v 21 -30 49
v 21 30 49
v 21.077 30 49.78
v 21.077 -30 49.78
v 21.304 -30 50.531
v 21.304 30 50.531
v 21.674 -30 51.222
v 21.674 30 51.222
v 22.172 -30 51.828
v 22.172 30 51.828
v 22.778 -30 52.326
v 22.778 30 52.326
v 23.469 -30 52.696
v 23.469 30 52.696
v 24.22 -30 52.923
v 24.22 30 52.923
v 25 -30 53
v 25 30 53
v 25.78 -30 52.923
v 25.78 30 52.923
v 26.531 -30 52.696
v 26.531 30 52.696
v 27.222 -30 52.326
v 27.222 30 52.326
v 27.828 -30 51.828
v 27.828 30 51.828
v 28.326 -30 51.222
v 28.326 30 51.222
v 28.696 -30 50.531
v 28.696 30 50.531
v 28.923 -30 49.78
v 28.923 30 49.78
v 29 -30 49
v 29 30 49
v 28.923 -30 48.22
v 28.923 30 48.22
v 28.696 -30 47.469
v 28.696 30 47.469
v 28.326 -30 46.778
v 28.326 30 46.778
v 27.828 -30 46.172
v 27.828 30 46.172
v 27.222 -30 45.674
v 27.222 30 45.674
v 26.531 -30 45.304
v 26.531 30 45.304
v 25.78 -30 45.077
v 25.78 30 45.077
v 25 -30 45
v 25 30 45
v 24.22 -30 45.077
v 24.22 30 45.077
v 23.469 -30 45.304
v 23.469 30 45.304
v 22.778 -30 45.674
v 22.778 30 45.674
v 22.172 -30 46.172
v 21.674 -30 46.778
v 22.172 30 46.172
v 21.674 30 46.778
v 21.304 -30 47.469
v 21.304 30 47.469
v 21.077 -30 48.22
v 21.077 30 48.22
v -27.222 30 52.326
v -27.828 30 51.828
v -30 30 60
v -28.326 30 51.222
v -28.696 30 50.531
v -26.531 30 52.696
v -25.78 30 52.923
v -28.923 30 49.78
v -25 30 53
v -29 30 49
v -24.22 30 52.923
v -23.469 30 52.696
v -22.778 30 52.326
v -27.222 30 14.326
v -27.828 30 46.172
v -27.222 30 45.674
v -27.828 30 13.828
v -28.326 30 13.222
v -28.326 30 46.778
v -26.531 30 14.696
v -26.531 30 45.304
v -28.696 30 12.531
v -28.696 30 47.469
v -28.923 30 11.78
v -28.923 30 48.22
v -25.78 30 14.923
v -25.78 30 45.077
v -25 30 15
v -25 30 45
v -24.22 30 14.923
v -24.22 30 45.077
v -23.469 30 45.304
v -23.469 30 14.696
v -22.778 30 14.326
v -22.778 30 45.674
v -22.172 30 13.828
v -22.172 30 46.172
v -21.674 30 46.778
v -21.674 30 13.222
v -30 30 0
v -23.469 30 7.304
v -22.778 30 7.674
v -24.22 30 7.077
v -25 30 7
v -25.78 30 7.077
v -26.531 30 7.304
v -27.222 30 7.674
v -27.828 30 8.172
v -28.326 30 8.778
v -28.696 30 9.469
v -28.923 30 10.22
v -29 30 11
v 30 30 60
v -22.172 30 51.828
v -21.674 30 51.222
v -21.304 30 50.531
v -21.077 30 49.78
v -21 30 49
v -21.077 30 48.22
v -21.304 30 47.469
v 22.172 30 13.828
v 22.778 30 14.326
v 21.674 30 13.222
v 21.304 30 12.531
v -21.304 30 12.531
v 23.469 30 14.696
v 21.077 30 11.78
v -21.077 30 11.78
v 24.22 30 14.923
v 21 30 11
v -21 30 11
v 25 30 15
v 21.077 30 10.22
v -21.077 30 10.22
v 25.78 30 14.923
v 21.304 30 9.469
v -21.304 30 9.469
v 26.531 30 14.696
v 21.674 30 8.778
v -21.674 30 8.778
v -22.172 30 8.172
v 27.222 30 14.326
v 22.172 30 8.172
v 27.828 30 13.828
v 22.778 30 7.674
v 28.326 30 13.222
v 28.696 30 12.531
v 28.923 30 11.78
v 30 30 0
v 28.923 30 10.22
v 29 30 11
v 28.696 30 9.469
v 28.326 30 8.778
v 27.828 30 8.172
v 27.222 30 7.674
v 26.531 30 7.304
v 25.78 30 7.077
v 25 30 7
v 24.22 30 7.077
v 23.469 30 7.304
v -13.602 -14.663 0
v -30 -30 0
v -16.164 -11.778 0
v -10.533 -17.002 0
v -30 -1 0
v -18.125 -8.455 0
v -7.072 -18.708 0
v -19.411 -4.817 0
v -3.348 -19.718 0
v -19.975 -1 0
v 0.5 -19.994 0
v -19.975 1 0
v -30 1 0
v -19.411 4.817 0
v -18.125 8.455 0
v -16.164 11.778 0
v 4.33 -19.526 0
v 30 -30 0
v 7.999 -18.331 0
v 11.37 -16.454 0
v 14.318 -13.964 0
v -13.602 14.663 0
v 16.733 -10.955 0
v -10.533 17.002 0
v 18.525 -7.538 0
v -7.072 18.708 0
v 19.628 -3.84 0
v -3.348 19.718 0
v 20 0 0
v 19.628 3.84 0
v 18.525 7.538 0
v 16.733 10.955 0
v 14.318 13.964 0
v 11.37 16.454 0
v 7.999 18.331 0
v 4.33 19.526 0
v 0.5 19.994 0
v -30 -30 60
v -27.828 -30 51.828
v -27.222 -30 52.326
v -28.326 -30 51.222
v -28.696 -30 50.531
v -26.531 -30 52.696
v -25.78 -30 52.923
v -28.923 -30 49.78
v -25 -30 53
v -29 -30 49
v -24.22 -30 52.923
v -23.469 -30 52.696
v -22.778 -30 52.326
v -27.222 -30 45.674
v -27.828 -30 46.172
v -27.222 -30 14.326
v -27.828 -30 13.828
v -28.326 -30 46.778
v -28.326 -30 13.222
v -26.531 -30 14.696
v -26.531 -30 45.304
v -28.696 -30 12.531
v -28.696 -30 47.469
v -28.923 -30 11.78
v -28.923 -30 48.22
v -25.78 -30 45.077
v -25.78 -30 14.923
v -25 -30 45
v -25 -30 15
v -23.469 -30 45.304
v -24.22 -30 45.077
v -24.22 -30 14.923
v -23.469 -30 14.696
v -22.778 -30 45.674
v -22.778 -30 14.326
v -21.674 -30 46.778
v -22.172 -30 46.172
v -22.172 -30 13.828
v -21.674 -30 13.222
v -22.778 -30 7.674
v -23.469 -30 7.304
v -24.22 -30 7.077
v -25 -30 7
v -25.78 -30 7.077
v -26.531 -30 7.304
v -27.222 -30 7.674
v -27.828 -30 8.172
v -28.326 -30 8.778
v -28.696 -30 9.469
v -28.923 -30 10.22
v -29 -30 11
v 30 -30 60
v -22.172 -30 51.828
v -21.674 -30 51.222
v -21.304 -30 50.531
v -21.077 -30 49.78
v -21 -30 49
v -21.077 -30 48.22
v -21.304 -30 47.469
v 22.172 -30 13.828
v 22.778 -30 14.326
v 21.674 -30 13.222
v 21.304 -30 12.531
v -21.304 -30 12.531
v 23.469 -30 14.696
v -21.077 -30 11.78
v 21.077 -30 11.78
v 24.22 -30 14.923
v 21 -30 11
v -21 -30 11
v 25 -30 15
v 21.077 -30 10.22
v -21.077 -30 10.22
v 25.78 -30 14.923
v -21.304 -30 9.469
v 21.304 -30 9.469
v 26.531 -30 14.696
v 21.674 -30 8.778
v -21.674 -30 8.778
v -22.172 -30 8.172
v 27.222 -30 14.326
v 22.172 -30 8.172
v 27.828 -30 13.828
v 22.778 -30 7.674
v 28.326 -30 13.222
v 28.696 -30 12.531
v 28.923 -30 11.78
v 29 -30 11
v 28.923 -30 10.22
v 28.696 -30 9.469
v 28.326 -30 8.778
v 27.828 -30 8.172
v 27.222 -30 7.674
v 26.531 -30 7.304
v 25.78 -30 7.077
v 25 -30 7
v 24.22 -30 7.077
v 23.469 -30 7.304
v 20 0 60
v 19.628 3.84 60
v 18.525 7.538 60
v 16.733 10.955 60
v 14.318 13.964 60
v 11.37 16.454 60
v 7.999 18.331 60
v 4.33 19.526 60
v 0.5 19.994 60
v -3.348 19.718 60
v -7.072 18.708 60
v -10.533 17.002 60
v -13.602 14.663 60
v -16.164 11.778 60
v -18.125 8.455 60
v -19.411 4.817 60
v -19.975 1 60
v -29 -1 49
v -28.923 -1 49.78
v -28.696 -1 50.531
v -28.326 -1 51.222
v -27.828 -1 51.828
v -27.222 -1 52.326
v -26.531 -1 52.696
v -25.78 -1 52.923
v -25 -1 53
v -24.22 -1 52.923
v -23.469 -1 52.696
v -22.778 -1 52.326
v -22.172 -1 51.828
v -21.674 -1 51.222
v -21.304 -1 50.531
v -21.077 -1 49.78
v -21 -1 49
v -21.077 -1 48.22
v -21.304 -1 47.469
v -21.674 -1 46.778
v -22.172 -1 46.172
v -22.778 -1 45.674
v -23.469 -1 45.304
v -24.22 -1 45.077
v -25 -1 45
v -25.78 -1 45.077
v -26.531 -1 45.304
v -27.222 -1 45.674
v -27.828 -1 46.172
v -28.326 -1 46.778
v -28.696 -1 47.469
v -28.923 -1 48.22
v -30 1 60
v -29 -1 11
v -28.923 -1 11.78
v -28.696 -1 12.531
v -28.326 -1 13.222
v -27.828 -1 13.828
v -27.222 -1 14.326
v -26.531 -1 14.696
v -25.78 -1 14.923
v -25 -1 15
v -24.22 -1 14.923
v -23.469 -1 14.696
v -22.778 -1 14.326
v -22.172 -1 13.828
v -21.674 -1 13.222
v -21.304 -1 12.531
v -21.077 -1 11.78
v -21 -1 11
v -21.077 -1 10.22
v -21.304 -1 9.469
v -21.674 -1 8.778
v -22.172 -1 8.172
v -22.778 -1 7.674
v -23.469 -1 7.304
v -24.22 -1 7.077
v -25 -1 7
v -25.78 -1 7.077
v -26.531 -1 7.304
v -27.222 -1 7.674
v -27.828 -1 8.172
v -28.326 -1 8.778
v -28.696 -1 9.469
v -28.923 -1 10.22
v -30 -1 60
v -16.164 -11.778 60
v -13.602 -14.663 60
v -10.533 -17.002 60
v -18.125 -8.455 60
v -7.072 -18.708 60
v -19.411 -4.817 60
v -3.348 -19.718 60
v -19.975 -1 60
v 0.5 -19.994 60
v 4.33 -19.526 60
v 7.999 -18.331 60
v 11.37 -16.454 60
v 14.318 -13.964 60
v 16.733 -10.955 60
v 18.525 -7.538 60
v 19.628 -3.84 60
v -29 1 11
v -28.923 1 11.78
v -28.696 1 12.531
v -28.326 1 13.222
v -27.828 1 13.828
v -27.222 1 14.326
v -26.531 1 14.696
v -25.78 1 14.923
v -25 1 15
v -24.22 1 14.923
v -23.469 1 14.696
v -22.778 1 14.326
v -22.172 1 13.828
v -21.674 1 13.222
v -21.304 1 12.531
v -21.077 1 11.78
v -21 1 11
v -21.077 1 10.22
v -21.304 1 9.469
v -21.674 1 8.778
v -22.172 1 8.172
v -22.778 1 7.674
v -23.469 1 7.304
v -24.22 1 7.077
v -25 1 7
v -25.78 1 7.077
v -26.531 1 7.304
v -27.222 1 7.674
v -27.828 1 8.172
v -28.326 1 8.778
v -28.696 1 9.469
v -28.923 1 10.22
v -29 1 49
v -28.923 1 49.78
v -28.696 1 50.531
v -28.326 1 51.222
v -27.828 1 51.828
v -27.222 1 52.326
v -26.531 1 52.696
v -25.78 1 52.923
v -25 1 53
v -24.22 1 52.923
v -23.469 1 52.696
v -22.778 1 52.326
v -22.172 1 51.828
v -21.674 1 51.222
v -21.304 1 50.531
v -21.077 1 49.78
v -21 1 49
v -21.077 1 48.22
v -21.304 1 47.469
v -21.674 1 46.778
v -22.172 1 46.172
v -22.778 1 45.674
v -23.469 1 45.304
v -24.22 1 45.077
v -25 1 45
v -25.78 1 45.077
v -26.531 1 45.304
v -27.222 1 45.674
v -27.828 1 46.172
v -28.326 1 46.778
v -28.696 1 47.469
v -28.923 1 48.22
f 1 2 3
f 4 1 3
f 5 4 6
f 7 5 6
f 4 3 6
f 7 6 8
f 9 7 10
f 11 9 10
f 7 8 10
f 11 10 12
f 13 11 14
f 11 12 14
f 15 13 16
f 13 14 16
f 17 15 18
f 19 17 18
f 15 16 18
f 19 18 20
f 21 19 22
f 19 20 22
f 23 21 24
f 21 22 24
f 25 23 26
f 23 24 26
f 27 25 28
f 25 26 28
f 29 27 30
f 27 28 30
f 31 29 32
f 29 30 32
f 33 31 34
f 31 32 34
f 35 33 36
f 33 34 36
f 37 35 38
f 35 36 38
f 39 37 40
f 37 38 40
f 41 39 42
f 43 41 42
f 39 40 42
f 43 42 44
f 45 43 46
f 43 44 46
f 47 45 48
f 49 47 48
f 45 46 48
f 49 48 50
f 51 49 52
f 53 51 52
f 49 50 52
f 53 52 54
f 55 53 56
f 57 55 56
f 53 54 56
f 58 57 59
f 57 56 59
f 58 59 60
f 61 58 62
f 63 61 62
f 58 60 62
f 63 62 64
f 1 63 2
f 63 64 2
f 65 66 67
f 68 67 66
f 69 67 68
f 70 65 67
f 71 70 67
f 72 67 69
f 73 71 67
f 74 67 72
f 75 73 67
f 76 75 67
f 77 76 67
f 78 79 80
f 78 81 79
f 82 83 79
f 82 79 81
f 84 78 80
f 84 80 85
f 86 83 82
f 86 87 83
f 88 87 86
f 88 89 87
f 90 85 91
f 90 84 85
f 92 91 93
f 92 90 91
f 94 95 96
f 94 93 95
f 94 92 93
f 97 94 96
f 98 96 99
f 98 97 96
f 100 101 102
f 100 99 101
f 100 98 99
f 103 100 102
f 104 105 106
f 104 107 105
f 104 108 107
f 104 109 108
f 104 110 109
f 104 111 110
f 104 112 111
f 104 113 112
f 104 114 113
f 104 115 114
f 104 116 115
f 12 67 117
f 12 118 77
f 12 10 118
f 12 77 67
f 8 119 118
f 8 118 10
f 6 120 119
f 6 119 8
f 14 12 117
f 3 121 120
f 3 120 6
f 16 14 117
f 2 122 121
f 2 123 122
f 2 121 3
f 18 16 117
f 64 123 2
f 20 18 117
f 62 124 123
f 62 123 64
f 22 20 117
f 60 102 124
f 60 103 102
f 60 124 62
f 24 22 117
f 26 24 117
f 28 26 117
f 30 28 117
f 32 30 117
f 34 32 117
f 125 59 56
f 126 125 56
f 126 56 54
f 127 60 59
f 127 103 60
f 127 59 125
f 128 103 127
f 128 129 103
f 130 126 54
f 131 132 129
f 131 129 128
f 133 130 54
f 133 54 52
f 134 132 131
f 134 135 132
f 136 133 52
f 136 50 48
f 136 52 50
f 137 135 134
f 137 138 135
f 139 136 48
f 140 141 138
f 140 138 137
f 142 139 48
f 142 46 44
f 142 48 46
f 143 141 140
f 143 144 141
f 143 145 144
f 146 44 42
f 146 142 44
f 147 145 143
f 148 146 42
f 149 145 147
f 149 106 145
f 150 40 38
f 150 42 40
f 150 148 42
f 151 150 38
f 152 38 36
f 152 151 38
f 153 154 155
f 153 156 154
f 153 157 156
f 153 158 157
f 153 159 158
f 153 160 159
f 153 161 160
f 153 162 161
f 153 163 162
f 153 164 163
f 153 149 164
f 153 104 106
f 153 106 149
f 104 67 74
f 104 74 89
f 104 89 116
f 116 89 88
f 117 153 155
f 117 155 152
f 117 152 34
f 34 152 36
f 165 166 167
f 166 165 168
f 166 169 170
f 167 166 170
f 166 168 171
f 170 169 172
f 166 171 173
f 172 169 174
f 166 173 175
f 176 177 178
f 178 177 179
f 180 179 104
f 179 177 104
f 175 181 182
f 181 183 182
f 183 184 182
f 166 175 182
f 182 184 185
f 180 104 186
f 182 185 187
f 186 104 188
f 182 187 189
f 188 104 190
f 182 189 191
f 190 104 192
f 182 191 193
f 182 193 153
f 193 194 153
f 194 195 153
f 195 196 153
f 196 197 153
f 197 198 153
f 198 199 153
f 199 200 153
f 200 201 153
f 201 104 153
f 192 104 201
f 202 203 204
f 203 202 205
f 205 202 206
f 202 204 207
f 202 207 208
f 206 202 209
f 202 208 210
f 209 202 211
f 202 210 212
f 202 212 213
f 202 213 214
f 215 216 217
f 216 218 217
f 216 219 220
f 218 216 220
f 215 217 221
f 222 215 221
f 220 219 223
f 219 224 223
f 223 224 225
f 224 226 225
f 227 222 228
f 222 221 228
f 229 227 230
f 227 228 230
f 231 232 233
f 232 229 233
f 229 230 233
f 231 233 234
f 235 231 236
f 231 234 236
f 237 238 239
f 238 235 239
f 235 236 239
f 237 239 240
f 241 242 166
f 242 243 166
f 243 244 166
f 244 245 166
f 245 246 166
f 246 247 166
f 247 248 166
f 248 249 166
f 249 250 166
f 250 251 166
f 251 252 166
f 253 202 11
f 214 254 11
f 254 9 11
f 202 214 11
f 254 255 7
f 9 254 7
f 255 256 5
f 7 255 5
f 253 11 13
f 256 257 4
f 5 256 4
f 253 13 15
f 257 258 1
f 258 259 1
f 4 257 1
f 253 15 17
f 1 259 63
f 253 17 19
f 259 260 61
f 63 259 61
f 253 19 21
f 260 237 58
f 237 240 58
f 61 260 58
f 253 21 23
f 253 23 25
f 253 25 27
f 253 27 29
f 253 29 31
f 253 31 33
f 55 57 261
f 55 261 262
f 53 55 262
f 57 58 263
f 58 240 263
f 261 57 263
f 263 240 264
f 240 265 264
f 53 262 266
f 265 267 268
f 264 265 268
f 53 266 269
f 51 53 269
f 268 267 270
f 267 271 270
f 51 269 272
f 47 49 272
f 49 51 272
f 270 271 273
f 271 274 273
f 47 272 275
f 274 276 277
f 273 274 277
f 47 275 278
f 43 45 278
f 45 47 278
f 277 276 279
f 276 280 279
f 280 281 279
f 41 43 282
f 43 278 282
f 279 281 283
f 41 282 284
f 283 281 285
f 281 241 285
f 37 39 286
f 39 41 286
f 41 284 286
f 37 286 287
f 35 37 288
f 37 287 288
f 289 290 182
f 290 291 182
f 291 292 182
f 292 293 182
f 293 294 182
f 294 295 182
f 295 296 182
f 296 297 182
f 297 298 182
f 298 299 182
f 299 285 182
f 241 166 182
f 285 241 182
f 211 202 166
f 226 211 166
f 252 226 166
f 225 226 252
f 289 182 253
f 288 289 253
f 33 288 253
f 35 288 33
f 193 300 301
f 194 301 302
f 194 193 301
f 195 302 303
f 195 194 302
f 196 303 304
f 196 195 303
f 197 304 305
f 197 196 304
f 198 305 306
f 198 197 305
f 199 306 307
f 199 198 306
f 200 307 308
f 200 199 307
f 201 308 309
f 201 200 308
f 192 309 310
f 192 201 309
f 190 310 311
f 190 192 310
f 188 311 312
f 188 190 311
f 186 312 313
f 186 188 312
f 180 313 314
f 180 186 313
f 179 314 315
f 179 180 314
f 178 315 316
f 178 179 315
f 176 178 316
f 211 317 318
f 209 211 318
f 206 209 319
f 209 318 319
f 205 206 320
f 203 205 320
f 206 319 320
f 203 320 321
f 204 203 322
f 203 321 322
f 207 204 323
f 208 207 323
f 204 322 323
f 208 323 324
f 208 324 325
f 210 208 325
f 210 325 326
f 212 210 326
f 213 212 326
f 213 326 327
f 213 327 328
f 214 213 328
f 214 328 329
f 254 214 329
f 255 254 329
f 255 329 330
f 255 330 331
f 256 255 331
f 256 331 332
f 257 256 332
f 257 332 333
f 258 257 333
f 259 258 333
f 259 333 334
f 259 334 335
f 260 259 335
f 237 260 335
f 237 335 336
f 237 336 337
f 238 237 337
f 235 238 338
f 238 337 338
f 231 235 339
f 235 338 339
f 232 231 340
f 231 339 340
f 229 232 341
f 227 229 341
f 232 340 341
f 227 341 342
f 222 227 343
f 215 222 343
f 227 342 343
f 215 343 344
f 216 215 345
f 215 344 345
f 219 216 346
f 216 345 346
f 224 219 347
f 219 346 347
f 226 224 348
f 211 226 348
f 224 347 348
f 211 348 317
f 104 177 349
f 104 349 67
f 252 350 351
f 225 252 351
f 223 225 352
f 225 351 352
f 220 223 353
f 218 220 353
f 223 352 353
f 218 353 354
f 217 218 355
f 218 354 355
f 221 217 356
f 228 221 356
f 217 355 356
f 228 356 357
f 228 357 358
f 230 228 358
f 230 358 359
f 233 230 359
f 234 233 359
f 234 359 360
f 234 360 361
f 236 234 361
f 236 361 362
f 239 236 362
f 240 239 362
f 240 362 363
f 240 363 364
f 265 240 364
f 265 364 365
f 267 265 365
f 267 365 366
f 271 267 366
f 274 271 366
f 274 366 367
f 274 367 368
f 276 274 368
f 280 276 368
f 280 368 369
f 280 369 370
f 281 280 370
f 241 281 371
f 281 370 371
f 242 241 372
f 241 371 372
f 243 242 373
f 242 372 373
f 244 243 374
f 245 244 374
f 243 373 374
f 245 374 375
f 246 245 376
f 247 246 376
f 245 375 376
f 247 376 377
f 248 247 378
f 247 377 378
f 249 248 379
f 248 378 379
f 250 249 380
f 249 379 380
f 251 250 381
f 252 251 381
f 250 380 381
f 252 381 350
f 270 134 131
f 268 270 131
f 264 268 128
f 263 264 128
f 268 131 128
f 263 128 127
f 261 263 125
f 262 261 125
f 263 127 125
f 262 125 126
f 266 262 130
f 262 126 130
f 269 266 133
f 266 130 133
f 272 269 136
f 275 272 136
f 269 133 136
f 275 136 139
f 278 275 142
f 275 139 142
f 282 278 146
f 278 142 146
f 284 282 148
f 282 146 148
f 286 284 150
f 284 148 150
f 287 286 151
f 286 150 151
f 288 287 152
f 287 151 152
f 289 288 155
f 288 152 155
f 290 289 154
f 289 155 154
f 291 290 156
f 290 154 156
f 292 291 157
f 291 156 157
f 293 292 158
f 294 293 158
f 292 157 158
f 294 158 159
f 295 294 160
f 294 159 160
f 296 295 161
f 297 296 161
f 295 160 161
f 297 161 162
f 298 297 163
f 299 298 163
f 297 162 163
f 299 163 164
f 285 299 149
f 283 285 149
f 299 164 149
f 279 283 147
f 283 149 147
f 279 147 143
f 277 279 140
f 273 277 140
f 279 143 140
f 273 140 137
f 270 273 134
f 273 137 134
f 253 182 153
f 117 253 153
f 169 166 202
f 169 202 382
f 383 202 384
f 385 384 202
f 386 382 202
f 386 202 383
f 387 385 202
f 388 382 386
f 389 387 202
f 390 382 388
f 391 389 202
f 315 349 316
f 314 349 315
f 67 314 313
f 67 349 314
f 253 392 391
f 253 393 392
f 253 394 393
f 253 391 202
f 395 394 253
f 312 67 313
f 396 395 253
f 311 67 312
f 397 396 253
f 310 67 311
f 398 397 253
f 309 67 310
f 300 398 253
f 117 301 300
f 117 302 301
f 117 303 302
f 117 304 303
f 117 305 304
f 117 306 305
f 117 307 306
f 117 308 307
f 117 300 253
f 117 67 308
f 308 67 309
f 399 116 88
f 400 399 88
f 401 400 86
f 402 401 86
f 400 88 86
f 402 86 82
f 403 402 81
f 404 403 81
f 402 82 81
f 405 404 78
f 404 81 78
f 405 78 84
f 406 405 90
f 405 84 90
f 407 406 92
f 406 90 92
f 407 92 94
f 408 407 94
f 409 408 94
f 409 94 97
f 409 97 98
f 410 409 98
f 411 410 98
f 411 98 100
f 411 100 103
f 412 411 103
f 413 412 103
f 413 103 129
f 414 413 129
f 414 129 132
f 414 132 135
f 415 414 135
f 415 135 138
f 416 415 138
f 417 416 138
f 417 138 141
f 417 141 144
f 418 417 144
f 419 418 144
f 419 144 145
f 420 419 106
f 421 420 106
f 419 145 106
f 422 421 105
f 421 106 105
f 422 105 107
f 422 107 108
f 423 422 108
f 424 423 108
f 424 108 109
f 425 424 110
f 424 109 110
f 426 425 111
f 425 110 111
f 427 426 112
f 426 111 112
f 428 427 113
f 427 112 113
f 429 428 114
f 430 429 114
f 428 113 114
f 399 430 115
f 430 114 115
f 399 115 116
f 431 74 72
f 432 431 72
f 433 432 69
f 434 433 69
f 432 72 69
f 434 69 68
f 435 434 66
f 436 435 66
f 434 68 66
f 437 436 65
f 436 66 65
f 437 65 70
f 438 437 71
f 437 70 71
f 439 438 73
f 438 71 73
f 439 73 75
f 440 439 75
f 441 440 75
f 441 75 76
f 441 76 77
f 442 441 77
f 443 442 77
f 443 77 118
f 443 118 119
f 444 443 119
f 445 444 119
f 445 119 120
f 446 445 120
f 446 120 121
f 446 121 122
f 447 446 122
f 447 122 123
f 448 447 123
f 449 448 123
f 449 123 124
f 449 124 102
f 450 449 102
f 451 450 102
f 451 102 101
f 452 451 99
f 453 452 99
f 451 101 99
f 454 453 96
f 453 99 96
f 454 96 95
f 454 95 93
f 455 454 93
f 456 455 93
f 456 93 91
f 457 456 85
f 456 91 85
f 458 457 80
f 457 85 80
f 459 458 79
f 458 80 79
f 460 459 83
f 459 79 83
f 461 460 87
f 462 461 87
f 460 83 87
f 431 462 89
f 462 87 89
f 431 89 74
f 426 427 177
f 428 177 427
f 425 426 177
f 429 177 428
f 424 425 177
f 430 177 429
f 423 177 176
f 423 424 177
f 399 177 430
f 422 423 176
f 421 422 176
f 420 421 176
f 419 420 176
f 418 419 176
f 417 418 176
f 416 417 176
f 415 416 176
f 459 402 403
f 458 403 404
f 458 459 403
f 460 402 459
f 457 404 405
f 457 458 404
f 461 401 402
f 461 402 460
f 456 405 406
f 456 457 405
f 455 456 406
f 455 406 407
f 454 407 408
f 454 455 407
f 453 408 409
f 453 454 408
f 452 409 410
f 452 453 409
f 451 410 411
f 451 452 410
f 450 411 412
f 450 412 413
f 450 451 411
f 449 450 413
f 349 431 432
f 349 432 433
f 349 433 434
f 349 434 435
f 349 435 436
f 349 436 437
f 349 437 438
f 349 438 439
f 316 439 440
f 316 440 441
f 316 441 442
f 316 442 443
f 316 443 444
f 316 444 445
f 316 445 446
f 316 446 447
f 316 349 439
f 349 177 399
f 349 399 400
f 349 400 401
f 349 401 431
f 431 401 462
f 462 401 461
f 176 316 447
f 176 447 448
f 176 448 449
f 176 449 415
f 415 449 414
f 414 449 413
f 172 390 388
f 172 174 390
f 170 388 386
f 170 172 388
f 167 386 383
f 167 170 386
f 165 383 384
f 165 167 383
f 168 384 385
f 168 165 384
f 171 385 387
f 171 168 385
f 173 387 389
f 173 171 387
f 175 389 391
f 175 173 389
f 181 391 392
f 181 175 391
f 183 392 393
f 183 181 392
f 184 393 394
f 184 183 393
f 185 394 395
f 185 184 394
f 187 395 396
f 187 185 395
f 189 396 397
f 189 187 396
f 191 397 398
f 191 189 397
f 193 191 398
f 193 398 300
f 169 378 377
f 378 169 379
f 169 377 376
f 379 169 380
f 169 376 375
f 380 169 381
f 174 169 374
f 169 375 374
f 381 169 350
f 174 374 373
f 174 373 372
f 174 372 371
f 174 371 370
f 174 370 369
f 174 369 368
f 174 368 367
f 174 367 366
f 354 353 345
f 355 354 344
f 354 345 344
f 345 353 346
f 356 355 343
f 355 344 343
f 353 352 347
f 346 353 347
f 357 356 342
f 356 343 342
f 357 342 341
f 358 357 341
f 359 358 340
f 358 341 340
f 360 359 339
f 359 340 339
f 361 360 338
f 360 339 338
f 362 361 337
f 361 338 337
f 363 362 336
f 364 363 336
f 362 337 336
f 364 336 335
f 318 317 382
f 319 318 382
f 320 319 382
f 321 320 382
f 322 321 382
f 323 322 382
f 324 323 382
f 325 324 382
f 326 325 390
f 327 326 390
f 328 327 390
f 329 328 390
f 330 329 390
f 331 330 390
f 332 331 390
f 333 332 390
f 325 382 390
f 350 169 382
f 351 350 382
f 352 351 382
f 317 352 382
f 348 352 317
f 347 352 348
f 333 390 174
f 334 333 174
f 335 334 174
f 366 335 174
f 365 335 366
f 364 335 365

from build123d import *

# Parameters (mm, degrees)
F0_W     = 60
F0_H     = 60
F0_R     = 20
F1_DEPTH = 60
F2_W     = 10.025016
F2_H     = 2
F3_DEPTH = 60.001
F4_R     = 4
F5_DEPTH = 60


with BuildPart() as f1:
    # F0 (on Top) → F1 (new body)
    with BuildSketch(Plane.XY):
        Rectangle(F0_W, F0_H)
        Circle(F0_R, mode=Mode.SUBTRACT)
    extrude(amount=F1_DEPTH)

    # F2 (on face) → F3 (cut, through all)
    with BuildSketch(Plane.XY.offset(60)):
        with Locations((-24.987492, 0)):
            Rectangle(F2_W, F2_H)
    extrude(amount=-F3_DEPTH, mode=Mode.SUBTRACT)

    # F4 (on face) → F5 (cut)
    with BuildSketch(Plane(origin=(0, 30, 0), x_dir=(-1, 0, 0), z_dir=(0, 1, 0))):
        with Locations((25, 11)):
            Circle(F4_R)
        with Locations((25, 49)):
            Circle(F4_R)
        with Locations((-25, 49)):
            Circle(F4_R)
        with Locations((-25, 11)):
            Circle(F4_R)
    extrude(amount=-F5_DEPTH, mode=Mode.SUBTRACT)


solid = f1.part
